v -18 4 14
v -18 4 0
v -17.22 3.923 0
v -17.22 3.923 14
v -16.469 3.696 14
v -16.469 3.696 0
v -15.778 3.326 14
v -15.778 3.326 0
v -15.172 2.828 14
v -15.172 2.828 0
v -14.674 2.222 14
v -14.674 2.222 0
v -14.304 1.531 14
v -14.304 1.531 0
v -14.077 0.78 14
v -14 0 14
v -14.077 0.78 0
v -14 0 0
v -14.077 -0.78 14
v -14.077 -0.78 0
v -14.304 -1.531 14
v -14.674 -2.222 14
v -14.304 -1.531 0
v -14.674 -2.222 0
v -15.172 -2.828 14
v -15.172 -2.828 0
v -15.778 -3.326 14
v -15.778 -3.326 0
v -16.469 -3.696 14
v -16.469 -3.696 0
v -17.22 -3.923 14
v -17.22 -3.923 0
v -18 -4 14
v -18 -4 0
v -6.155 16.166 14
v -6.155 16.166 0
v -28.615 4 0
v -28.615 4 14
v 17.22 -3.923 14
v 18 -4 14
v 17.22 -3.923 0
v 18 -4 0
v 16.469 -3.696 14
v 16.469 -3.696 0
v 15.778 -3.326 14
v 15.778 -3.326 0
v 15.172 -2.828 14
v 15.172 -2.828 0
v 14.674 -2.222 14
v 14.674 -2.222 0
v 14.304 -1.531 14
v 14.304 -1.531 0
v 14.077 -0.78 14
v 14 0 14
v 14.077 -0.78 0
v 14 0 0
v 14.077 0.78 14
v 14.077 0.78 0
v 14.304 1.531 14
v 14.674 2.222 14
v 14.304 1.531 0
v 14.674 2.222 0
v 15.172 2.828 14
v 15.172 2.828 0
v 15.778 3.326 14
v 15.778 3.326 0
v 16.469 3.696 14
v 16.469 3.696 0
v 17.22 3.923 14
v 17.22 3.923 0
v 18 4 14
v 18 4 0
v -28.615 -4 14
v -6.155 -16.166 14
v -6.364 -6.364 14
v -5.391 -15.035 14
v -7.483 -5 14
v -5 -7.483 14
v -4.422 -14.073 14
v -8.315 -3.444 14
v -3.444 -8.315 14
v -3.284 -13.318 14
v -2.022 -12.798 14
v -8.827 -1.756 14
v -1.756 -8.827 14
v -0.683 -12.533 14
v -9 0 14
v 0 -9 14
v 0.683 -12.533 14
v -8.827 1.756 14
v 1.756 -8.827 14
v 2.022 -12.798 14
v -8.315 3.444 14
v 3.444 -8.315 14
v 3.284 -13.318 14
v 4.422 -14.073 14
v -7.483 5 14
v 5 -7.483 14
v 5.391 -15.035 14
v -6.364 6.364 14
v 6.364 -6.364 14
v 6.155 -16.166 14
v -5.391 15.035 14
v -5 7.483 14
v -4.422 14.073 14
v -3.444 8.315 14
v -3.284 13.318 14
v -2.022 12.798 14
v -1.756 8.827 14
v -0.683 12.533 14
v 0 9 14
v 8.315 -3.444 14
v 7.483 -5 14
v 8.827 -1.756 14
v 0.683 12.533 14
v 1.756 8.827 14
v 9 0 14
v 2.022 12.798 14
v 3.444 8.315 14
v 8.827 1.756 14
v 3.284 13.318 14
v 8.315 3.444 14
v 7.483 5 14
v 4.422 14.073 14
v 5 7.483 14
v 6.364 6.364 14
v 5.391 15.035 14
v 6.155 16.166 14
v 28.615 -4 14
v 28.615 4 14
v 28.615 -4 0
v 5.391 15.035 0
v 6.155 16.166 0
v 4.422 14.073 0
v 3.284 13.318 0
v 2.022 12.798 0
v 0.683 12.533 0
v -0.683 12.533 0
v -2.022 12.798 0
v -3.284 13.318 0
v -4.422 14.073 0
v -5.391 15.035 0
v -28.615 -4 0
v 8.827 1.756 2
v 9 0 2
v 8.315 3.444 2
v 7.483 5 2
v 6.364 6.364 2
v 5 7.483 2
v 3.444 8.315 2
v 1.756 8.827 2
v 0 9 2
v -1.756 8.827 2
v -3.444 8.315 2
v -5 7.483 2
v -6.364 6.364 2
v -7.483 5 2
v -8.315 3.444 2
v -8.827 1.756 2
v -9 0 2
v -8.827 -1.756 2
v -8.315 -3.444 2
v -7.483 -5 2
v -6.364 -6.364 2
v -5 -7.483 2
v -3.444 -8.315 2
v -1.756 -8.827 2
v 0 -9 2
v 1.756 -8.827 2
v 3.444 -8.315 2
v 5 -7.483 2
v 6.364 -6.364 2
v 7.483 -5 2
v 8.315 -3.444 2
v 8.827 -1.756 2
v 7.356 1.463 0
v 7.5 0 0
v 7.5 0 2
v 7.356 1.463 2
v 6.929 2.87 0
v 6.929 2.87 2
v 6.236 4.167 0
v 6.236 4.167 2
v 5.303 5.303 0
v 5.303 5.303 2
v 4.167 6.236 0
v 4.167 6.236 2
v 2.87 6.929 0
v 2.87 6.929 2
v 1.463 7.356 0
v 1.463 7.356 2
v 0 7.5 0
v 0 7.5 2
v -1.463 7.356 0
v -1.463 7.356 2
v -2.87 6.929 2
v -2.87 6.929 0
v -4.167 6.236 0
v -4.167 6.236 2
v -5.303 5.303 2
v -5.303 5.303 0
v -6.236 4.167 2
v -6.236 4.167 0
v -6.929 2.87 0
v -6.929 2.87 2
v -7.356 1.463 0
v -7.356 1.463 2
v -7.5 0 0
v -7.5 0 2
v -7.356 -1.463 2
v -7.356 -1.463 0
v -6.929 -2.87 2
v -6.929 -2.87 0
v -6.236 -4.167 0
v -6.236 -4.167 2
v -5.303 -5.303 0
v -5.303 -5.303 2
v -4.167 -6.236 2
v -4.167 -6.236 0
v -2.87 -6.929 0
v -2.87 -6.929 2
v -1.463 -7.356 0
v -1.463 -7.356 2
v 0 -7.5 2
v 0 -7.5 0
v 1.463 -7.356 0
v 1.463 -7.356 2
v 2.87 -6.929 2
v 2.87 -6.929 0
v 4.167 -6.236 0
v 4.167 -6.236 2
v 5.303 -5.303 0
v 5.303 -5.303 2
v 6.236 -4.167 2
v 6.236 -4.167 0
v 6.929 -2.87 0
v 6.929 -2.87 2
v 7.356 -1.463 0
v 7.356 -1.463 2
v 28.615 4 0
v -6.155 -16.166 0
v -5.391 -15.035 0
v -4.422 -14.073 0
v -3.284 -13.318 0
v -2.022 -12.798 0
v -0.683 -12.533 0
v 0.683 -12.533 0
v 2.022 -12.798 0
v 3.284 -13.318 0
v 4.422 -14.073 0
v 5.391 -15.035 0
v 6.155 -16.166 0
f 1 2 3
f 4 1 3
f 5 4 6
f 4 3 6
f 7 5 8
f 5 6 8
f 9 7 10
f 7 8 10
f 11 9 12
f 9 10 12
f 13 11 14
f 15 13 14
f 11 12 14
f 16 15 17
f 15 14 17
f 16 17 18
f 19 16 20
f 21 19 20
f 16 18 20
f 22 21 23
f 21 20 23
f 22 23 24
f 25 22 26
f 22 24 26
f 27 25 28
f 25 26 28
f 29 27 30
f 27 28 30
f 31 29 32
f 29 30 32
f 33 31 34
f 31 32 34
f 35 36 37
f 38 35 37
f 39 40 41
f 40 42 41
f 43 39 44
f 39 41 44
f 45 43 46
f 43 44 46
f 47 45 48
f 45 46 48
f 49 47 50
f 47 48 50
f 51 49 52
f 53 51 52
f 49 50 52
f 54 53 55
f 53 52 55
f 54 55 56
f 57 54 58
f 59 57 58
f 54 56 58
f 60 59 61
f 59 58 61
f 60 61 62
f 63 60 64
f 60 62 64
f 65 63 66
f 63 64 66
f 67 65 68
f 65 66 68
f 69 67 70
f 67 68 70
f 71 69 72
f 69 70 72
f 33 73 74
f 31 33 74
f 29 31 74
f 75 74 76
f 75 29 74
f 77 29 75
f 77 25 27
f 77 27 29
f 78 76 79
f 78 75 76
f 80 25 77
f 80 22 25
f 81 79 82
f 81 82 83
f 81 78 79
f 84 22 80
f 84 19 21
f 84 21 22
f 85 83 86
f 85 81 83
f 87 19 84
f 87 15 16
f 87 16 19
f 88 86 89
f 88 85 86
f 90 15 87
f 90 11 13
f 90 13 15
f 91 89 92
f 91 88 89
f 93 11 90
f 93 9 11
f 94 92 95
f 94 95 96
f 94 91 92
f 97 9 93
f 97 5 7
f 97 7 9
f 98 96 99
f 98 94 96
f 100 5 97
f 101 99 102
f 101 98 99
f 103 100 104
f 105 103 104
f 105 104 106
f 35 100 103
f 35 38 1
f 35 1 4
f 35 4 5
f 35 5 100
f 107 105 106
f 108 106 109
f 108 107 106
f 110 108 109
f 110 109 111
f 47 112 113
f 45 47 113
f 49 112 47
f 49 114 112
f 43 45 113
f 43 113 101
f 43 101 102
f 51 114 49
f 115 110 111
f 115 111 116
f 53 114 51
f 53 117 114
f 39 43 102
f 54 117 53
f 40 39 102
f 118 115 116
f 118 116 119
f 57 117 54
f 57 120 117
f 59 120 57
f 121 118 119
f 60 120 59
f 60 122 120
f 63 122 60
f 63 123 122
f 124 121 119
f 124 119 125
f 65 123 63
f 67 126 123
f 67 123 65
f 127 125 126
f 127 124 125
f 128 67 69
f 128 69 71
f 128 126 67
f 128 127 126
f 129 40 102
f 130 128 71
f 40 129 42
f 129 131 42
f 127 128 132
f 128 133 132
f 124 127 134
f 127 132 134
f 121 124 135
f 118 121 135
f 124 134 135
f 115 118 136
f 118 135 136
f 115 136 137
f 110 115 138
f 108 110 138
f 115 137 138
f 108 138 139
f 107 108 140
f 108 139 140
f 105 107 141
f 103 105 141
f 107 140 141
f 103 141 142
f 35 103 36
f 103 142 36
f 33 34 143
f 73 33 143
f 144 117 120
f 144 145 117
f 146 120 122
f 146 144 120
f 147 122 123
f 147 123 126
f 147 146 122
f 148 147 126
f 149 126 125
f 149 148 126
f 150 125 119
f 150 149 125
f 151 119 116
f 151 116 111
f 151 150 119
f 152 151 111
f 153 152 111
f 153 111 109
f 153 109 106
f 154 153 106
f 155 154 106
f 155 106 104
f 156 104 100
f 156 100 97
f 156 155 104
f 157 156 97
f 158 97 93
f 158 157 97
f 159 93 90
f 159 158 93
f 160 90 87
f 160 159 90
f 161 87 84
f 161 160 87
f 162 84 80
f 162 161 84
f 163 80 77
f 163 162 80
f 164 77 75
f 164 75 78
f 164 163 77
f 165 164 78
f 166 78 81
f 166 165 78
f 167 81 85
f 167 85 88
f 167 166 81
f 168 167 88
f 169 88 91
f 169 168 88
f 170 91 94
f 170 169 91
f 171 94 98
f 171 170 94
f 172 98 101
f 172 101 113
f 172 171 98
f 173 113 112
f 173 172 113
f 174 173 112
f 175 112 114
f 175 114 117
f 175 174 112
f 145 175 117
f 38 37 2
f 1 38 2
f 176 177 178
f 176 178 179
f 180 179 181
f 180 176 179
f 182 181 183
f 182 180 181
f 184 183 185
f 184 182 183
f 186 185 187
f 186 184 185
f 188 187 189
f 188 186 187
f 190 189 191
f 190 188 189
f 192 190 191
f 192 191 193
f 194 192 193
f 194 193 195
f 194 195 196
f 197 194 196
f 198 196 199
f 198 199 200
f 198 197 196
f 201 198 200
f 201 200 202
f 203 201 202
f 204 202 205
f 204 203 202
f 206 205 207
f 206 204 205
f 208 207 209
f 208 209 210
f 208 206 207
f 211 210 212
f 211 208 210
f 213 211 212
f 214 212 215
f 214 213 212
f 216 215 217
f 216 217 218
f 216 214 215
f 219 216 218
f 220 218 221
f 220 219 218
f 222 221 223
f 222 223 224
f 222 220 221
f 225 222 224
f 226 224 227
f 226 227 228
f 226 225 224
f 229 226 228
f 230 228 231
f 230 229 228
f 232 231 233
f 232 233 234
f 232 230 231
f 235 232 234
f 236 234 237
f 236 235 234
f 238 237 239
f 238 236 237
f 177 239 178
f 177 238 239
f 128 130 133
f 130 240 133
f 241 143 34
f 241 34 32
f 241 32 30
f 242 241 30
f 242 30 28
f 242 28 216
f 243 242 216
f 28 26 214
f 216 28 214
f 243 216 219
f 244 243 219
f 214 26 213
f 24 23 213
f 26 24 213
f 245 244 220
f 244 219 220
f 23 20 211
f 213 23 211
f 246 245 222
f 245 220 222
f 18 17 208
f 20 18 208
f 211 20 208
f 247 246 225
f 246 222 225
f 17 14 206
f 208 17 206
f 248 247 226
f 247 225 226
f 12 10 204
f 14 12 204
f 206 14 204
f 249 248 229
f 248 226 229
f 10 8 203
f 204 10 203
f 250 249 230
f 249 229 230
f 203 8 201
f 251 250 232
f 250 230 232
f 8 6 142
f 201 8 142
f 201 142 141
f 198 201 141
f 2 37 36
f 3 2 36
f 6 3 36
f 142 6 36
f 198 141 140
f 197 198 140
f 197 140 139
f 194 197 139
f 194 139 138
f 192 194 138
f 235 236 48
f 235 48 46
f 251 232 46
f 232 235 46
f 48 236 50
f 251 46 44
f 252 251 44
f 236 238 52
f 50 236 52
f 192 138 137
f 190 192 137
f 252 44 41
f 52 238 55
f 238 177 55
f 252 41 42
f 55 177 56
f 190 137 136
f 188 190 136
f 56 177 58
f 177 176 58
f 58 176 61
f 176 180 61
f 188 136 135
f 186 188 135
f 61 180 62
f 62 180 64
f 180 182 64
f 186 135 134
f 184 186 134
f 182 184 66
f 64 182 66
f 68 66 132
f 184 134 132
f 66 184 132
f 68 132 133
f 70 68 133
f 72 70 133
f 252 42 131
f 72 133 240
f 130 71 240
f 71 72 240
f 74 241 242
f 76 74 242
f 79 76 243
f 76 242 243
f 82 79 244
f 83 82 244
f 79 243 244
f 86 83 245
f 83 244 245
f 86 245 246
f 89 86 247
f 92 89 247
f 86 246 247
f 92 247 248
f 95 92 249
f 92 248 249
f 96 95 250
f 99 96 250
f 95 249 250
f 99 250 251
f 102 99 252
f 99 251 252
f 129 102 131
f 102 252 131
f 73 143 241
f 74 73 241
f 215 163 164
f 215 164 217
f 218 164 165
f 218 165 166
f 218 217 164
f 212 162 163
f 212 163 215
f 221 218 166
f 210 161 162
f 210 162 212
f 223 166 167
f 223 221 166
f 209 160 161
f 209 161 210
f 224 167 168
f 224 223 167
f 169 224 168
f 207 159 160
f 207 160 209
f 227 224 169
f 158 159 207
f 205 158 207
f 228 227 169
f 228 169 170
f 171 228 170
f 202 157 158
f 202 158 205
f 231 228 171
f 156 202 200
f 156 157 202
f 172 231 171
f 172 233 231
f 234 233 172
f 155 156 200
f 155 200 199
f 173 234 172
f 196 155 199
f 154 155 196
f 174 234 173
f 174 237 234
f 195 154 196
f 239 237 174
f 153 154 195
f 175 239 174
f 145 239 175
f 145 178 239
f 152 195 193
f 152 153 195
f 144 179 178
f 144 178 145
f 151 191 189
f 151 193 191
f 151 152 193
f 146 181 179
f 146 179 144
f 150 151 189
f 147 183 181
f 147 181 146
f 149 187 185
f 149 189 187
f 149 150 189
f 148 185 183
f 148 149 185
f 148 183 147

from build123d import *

# Parameters (mm, degrees)
F0_R      = 9
F1_DEPTH  = 12
F1_FACE_R = 9
F0_R_2    = 7.5
F2_DEPTH  = 2


with BuildPart() as f1:
    # F0 (on Top) → F1 (new body)
    with BuildSketch(Plane.XY):
        with BuildLine():
            ThreePointArc((6.155044, 16.166018), (0, 12.5), (-6.155044, 16.166018))
            Line((-6.155044, 16.166018), (-28.615385, 4))
            Line((-28.615385, 4), (-18, 4))
            ThreePointArc((-18, 4), (-14, 0), (-18, -4))
            Line((-18, -4), (-28.615385, -4))
            Line((-28.615385, -4), (-6.155044, -16.166018))
            ThreePointArc((-6.155044, -16.166018), (0, -12.5), (6.155044, -16.166018))
            Line((6.155044, -16.166018), (28.615385, -4))
            Line((28.615385, -4), (18, -4))
            ThreePointArc((18, -4), (14, 0), (18, 4))
            Line((18, 4), (28.615385, 4))
            Line((28.615385, 4), (6.155044, 16.166018))
        make_face()
        Circle(F0_R, mode=Mode.SUBTRACT)
    extrude(amount=F1_DEPTH)

    # F1_face (on face) + F0 (on Top) → F2 (join)
    with BuildSketch(Plane.XY.offset(12)):
        with BuildLine():
            ThreePointArc((-6.155044, -16.166018), (0, -12.5), (6.155044, -16.166018))
            Line((6.155044, -16.166018), (28.615385, -4))
            Line((28.615385, -4), (18, -4))
            ThreePointArc((18, -4), (14, 0), (18, 4))
            Line((18, 4), (28.615385, 4))
            Line((28.615385, 4), (6.155044, 16.166018))
            ThreePointArc((6.155044, 16.166018), (0, 12.5), (-6.155044, 16.166018))
            Line((-6.155044, 16.166018), (-28.615385, 4))
            Line((-28.615385, 4), (-18, 4))
            ThreePointArc((-18, 4), (-14, 0), (-18, -4))
            Line((-18, -4), (-28.615385, -4))
            Line((-28.615385, -4), (-6.155044, -16.166018))
        make_face()
        Circle(F1_FACE_R, mode=Mode.SUBTRACT)
    with BuildSketch(Plane.XY):
        Circle(F0_R)
        Circle(F0_R_2, mode=Mode.SUBTRACT)
    extrude(amount=F2_DEPTH)


solid = f1.part
